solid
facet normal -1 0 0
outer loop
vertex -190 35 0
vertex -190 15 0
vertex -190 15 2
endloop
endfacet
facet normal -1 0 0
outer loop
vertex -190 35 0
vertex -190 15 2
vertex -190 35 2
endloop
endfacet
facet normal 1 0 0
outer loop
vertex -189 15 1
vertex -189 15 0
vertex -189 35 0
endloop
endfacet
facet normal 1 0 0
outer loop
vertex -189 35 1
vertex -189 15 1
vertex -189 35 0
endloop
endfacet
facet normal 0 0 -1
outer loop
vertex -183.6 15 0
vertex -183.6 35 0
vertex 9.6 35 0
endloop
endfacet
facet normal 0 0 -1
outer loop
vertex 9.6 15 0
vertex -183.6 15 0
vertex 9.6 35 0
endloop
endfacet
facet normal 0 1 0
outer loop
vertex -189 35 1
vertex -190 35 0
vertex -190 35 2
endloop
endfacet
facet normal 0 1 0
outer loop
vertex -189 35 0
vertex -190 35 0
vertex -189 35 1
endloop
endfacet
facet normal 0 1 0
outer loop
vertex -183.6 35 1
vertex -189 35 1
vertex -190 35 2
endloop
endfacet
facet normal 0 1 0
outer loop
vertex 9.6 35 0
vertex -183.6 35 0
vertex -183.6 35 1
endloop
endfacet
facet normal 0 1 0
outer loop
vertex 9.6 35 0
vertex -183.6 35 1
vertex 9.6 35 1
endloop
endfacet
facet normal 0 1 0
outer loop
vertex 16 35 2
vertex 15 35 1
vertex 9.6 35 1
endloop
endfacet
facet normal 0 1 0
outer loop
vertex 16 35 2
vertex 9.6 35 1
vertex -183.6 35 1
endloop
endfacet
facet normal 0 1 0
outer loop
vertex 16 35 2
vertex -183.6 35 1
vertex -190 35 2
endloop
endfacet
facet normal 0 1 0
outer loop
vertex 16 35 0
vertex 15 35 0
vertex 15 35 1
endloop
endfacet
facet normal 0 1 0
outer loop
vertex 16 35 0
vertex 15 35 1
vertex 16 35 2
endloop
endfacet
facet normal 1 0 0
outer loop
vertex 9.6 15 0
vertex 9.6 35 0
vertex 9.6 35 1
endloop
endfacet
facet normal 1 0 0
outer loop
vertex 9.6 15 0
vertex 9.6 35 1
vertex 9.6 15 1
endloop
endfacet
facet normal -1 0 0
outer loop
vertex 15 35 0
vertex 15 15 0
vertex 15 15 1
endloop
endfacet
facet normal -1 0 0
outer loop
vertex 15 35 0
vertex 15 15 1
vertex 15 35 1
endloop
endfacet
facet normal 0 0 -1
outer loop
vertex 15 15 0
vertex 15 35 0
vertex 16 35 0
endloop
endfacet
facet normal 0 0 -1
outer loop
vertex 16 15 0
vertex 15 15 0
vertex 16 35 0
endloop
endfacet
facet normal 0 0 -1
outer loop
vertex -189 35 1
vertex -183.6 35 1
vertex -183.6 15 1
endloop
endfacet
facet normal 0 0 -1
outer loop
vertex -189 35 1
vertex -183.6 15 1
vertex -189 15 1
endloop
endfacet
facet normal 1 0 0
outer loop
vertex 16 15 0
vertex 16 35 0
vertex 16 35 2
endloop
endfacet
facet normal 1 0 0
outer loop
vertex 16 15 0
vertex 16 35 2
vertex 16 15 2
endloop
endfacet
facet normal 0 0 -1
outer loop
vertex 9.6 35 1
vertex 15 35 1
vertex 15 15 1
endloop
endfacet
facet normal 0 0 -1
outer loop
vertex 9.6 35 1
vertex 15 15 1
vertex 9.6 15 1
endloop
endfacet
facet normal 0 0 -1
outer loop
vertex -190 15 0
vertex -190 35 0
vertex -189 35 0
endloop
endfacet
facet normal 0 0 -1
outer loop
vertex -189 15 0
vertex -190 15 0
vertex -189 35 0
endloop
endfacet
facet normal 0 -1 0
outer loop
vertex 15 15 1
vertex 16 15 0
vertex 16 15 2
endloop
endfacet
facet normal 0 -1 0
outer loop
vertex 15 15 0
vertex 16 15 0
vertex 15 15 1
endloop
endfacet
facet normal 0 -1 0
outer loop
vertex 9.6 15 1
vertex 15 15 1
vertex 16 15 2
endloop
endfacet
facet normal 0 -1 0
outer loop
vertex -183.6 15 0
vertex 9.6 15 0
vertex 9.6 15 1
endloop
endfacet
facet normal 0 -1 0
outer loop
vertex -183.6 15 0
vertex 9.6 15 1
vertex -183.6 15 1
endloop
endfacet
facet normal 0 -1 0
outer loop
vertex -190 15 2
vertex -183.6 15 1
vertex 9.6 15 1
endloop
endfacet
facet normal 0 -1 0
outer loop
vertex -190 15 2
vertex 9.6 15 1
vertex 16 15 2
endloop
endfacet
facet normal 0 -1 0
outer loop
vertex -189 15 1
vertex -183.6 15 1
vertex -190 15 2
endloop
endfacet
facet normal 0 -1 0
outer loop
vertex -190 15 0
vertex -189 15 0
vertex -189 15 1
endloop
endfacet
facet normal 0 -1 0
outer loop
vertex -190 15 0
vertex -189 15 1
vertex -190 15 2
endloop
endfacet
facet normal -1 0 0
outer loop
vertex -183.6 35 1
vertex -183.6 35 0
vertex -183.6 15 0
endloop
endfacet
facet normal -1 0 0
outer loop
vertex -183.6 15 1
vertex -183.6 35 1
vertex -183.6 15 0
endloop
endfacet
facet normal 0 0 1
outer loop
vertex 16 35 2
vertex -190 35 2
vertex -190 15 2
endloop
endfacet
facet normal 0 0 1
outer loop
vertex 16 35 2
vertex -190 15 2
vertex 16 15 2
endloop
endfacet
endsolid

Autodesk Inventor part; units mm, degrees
ref_plane "YZ Plane" through (0, 0, 0) normal (1, 0, 0) x (0, 1, 0)
ref_plane "XZ Plane" through (0, 0, 0) normal (0, 1, 0) x (-1, 0, 0)
ref_plane "XY Plane" through (0, 0, 0) normal (0, 0, 1) x (1, 0, 0)
sketch "스케치1" plane through (0, 0, 0) normal (0, 0, 1) x (1, 0, 0)
  line L0 (-190, 35) -> (16, 35)
  line L1 (16, 35) -> (16, 15)
  line L2 (16, 15) -> (-190, 15)
  line L3 (-190, 15) -> (-190, 35)
  point P0 (0, 0)
  dimension "d0" = 206
  dimension "d1" = 20
extrude "돌출1" add sketch "스케치1" along normal blind 2
sketch "스케치2" plane through (0, 0, 0) normal (0, 0, -1) x (-1, 0, 0)
  line L0 (-16, 35) -> (190, 35) projected
  line L1 (190, 15) -> (-16, 15) projected
  line L2 (-15, 35) -> (-9.6, 35)
  line L3 (-9.6, 35) -> (-9.6, 15)
  line L4 (-9.6, 15) -> (-15, 15)
  line L5 (-15, 15) -> (-15, 35)
  line L6 (189, 35) -> (183.6, 35)
  line L7 (183.6, 35) -> (183.6, 15)
  line L8 (183.6, 15) -> (189, 15)
  line L9 (189, 15) -> (189, 35)
  line L10 (190, 15) -> (190, 35) projected
  line L11 (-16, 35) -> (-16, 15) projected
  point P0 (0, 0)
  dimension "d4" = 5.4
  dimension "d5" = 5.4
  dimension "d6" = 1
  dimension "d7" = 1
extrude "돌출2" cut sketch "스케치2" against normal blind 1 contours L0 L3 L1 L5 | L0 L9 L1 L7
properties part number "앞판_위" material "알루미늄 6061"
